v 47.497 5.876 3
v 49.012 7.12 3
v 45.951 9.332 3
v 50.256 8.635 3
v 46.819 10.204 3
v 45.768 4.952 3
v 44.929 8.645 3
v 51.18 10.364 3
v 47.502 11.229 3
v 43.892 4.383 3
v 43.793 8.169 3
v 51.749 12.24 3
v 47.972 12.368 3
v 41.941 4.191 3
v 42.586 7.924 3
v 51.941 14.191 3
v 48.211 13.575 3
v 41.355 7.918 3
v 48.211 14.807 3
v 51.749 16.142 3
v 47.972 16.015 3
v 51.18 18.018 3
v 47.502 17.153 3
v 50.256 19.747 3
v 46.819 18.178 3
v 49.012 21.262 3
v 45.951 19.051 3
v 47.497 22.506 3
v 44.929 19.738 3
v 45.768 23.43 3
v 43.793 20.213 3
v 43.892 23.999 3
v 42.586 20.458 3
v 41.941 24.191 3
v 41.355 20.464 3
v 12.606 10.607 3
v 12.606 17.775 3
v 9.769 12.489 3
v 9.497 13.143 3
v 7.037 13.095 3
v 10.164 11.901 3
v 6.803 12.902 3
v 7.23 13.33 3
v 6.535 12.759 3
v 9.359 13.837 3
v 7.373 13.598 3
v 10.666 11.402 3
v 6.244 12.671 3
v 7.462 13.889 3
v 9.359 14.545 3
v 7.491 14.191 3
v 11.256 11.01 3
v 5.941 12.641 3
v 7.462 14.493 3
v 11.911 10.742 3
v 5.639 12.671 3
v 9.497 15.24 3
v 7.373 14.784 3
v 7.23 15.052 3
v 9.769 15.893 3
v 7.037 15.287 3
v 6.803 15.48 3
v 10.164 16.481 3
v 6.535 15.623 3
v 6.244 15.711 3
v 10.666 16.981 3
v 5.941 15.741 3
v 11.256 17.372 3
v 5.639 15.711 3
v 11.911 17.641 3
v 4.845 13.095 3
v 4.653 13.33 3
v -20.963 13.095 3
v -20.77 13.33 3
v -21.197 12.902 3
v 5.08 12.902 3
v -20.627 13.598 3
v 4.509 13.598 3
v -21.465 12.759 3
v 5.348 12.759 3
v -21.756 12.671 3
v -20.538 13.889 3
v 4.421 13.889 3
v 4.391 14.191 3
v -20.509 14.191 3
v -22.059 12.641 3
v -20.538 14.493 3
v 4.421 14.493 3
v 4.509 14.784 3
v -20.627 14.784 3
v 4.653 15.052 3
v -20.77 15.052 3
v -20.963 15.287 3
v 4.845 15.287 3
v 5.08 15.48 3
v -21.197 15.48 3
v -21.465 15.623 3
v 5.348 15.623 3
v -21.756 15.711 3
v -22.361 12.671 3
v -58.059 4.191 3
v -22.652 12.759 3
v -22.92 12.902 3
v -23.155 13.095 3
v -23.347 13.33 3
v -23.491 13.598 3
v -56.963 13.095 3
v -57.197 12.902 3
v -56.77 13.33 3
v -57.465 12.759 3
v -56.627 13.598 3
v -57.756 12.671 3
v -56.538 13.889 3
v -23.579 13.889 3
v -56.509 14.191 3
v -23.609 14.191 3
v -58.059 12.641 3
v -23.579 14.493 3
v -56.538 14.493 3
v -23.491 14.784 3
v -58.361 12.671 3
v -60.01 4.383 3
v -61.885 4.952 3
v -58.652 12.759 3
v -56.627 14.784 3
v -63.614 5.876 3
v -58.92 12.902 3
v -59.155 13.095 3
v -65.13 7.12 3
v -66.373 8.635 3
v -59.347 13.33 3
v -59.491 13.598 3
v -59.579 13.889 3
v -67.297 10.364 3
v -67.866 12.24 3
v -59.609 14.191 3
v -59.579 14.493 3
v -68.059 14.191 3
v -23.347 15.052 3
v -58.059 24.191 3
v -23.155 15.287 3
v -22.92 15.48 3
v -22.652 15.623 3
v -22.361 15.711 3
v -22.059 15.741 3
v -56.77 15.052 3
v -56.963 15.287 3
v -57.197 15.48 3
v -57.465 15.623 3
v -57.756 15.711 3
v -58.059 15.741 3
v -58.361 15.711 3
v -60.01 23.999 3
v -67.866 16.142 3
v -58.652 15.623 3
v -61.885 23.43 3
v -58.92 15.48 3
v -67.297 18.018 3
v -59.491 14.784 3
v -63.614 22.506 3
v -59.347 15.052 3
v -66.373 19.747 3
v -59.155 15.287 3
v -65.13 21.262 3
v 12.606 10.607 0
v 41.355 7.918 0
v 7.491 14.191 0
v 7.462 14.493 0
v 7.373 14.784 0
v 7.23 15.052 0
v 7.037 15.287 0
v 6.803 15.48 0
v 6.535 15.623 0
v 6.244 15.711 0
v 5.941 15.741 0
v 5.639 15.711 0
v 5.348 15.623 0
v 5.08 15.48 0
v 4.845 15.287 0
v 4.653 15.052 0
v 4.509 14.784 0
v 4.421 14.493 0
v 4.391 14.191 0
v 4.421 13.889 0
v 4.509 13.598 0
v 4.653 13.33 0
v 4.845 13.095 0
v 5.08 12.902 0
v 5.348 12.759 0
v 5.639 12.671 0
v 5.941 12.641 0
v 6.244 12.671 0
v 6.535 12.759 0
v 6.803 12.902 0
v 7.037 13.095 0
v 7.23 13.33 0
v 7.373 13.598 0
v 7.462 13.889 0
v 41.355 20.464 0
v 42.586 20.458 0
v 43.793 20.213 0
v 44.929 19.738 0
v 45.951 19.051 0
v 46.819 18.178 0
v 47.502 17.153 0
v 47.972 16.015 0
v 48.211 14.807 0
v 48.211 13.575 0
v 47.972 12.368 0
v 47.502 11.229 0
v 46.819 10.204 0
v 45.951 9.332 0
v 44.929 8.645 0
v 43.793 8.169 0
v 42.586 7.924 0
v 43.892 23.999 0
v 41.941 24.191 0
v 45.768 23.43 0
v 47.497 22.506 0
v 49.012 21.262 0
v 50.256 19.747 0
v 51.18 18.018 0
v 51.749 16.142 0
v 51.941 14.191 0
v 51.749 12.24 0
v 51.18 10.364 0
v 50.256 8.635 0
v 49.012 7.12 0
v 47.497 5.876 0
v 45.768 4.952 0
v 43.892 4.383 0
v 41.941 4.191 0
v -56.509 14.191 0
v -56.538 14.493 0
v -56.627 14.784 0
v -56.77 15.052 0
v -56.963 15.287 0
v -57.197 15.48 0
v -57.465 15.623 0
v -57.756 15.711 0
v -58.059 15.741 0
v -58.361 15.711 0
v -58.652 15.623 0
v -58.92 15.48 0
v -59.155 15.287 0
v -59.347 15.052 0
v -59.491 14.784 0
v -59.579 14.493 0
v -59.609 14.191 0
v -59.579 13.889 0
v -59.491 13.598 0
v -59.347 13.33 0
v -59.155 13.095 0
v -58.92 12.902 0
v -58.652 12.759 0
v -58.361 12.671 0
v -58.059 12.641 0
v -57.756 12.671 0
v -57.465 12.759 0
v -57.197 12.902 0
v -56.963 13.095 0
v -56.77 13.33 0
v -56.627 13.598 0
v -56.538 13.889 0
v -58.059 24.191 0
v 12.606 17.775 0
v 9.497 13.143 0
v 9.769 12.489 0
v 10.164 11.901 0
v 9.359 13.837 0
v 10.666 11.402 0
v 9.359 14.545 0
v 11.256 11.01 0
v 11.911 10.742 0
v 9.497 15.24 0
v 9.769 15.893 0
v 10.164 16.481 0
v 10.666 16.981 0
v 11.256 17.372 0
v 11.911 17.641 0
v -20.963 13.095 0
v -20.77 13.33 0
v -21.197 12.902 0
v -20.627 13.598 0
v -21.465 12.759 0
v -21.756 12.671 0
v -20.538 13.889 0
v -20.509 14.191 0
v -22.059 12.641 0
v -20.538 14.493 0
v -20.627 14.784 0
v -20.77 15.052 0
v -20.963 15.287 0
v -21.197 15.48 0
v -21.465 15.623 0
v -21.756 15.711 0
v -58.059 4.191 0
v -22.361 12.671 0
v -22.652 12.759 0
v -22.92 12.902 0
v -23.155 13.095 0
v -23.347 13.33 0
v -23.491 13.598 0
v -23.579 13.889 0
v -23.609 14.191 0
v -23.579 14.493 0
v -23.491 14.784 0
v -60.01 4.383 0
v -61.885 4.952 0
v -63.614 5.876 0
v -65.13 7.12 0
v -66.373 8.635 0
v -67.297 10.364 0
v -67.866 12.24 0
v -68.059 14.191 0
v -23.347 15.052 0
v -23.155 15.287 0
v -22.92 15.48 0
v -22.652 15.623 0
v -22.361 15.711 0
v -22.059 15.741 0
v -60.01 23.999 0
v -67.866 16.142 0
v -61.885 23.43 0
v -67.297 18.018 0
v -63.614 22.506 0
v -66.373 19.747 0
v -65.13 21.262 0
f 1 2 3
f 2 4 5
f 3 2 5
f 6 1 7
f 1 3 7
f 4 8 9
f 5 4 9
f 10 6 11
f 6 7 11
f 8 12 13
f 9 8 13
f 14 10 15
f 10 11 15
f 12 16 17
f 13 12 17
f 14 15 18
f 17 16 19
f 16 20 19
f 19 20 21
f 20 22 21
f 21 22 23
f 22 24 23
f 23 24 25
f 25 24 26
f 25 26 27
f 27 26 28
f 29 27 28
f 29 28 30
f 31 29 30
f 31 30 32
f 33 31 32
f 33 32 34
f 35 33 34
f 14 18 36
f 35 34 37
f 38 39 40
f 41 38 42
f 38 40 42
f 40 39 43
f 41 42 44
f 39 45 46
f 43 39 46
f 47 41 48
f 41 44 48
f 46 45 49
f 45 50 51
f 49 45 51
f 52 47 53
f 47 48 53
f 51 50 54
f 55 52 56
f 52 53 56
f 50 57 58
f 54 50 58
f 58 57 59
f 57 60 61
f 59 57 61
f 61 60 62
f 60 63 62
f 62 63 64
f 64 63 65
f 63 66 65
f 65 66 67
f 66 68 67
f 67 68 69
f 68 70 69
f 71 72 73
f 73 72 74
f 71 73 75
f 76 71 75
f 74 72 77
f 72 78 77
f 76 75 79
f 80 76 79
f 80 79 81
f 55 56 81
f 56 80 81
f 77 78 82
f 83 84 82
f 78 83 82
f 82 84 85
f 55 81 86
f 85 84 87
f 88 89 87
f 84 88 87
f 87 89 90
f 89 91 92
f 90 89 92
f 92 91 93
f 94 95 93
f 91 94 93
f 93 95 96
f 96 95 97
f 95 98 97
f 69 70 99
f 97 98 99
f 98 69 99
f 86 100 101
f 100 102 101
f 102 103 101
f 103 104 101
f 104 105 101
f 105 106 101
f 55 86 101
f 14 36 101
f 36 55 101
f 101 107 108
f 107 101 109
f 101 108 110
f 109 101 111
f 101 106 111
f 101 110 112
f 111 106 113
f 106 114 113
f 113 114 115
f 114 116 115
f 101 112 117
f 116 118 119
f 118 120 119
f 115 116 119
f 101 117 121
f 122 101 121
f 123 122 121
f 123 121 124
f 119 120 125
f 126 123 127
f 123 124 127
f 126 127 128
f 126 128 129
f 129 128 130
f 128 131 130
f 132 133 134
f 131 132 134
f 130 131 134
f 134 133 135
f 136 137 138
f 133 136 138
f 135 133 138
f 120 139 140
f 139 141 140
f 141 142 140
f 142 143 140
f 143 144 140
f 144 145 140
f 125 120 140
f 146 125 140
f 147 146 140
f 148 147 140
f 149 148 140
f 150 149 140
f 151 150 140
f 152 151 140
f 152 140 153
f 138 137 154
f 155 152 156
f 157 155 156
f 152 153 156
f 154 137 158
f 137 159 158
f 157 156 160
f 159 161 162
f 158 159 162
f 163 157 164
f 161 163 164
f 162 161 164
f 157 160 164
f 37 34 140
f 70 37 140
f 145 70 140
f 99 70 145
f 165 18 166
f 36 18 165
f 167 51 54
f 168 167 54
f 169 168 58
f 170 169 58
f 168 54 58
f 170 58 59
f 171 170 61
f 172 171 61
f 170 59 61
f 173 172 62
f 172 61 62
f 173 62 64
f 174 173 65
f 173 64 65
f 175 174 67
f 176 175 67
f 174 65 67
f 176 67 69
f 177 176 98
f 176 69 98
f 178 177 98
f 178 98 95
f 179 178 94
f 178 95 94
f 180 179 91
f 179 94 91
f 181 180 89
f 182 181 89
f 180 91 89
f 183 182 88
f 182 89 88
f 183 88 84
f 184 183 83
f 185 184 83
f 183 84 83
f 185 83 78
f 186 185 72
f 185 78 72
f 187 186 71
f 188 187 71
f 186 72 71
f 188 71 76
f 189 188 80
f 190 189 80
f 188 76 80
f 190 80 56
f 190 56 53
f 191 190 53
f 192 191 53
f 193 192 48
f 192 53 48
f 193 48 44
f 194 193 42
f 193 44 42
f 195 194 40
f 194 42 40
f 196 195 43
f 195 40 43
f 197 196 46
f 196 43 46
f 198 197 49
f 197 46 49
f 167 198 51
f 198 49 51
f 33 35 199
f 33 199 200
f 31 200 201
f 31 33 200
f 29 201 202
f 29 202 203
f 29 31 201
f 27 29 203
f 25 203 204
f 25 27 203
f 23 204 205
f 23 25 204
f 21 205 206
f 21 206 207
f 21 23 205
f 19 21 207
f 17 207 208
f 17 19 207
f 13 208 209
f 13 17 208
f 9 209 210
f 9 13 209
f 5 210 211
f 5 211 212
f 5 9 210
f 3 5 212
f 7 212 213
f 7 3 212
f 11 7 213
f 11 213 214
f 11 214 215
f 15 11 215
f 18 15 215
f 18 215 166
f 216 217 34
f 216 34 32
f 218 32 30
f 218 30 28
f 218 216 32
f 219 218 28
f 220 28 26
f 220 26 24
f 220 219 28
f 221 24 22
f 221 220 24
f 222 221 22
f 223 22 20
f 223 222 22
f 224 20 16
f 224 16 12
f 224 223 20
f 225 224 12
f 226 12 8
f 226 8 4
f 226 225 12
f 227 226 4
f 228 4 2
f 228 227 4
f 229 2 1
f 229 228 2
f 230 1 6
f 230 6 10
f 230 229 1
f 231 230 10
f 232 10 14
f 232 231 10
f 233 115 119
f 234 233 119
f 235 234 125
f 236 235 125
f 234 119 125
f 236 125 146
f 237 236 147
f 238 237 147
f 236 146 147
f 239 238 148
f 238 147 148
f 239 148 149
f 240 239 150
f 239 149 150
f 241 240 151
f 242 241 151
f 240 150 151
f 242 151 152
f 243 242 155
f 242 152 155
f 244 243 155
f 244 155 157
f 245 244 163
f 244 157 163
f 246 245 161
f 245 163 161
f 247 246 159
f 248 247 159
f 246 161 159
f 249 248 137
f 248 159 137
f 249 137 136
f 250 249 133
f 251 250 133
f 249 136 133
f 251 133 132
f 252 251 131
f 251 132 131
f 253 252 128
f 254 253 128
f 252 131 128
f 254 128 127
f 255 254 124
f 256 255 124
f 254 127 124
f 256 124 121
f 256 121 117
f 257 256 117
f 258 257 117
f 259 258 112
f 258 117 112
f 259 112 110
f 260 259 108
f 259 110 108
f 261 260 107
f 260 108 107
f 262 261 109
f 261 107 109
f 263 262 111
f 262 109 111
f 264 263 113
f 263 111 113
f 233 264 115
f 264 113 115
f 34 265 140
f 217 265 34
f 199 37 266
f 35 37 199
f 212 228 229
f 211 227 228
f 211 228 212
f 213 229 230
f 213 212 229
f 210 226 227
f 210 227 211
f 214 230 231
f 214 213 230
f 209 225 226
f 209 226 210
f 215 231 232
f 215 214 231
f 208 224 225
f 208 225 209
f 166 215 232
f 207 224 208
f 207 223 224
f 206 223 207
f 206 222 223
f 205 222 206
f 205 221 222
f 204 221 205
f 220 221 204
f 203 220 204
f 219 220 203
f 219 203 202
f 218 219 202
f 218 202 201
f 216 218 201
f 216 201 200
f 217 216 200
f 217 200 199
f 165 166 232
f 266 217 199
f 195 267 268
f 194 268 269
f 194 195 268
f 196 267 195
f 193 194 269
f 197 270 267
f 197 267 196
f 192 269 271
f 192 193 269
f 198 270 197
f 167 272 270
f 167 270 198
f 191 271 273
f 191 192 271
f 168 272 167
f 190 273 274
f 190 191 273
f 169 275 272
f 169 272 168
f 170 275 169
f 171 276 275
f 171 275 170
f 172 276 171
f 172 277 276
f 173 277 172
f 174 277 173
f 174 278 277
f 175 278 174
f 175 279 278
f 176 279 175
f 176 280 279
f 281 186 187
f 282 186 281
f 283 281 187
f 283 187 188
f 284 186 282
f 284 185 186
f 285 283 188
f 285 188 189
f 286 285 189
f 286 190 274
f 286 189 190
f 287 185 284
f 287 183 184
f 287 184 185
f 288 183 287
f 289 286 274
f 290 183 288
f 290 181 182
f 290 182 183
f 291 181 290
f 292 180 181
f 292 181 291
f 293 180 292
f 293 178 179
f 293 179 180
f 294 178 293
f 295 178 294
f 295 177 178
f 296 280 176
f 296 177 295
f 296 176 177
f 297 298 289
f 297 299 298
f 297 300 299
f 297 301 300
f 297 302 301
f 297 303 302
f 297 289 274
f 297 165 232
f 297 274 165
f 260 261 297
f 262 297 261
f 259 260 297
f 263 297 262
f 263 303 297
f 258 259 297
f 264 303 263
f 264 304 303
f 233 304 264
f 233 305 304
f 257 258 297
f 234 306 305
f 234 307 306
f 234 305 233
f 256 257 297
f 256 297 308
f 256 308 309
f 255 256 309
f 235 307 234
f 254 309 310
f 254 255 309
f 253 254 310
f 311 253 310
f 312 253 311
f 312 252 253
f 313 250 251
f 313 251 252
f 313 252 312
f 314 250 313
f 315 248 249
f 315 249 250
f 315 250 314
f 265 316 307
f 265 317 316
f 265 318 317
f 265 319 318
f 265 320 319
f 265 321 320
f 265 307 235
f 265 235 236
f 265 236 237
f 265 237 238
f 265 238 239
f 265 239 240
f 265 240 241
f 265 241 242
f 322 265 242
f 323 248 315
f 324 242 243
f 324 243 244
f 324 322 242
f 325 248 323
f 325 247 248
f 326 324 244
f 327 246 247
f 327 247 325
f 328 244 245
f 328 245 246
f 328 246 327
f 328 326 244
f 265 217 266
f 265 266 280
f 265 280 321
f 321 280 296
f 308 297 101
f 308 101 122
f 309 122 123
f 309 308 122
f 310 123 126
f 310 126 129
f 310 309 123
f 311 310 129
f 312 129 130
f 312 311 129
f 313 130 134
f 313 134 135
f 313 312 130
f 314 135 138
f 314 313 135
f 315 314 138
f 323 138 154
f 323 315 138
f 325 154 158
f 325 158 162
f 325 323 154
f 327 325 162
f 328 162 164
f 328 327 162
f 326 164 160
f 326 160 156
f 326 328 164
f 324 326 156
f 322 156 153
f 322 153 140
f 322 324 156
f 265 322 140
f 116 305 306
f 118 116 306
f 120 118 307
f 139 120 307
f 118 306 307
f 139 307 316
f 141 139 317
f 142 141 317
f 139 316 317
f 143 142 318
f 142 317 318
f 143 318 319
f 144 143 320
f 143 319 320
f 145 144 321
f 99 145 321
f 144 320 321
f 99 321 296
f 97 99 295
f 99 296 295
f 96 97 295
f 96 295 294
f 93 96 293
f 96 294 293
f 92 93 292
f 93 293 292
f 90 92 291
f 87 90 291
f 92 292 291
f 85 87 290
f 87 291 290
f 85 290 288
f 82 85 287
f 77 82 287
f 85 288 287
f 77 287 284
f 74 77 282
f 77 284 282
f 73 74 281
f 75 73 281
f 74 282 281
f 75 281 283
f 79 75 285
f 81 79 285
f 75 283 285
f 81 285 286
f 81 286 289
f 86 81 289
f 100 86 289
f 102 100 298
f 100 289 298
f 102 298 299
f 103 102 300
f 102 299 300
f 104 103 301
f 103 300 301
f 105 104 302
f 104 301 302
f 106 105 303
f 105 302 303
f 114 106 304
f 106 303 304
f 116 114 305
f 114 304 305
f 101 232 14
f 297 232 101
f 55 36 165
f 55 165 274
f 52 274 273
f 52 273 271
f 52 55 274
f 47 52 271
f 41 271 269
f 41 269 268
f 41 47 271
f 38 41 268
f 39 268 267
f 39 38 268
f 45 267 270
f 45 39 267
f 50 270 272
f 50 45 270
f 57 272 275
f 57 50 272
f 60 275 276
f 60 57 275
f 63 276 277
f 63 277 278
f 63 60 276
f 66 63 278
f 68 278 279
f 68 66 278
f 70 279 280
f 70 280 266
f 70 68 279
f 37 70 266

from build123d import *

# Parameters (mm, degrees)
BOSS_EXTRUDE1_DEPTH = 3
SKETCH3_R           = 1.55
CUT_EXTRUDE2_DEPTH  = 3
SKETCH4_R           = 1.55
CUT_EXTRUDE4_DEPTH  = 3
SKETCH5_R           = 1.55
CUT_EXTRUDE6_DEPTH  = 3
CUT_EXTRUDE7_DEPTH  = 3


with BuildPart() as part:
    # Sketch1 → Boss-Extrude1 (new body)
    with BuildSketch(Plane.XY):
        with BuildLine():
            Line((-58.058617241, 24.191090517), (41.941382759, 24.191090517))
            ThreePointArc((41.941382759, 24.191090517), (51.941382759, 14.191090517), (41.941382759, 4.191090517))
            Line((41.941382759, 4.191090517), (-58.058617241, 4.191090517))
            ThreePointArc((-58.058617241, 4.191090517), (-68.058617241, 14.191090517), (-58.058617241, 24.191090517))
        make_face()
    extrude(amount=BOSS_EXTRUDE1_DEPTH)

    # Sketch3 → Cut-Extrude2 (cut)
    with BuildSketch(Plane.XY.offset(3)):
        with Locations((-58.058617241, 14.191090517)):
            Circle(SKETCH3_R)
    extrude(amount=-CUT_EXTRUDE2_DEPTH, mode=Mode.SUBTRACT)

    # Sketch4 → Cut-Extrude4 (cut)
    with BuildSketch(Plane(origin=(9.979459273, 1.433252018, 3), x_dir=(1, 0, 0), z_dir=(0, 0, 1))):
        with Locations((-4.038076514, 12.757838499)):
            Circle(SKETCH4_R)
    extrude(amount=-CUT_EXTRUDE4_DEPTH, mode=Mode.SUBTRACT)

    # Sketch5 → Cut-Extrude6 (cut)
    with BuildSketch(Plane(origin=(-9.979459273, 1.433252018, 0), x_dir=(-1, 0, 0), z_dir=(0, 0, -1))):
        with Locations((12.079157968, 12.757838499)):
            Circle(SKETCH5_R)
    extrude(amount=-CUT_EXTRUDE6_DEPTH, mode=Mode.SUBTRACT)

    # Sketch6 → Cut-Extrude7 (cut)
    with BuildSketch(Plane.XY.offset(3)):
        with BuildLine():
            Line((12.606210345, 17.775453704), (41.354831035, 20.463726093))
            ThreePointArc((41.354831035, 20.463726093), (48.241382759, 14.191090517), (41.354831035, 7.918454941))
            Line((41.354831035, 7.918454941), (12.606210345, 10.60672733))
            ThreePointArc((12.606210345, 10.60672733), (9.341382759, 14.191090517), (12.606210345, 17.775453704))
        make_face()
    extrude(amount=-CUT_EXTRUDE7_DEPTH, mode=Mode.SUBTRACT)


solid = part.part
